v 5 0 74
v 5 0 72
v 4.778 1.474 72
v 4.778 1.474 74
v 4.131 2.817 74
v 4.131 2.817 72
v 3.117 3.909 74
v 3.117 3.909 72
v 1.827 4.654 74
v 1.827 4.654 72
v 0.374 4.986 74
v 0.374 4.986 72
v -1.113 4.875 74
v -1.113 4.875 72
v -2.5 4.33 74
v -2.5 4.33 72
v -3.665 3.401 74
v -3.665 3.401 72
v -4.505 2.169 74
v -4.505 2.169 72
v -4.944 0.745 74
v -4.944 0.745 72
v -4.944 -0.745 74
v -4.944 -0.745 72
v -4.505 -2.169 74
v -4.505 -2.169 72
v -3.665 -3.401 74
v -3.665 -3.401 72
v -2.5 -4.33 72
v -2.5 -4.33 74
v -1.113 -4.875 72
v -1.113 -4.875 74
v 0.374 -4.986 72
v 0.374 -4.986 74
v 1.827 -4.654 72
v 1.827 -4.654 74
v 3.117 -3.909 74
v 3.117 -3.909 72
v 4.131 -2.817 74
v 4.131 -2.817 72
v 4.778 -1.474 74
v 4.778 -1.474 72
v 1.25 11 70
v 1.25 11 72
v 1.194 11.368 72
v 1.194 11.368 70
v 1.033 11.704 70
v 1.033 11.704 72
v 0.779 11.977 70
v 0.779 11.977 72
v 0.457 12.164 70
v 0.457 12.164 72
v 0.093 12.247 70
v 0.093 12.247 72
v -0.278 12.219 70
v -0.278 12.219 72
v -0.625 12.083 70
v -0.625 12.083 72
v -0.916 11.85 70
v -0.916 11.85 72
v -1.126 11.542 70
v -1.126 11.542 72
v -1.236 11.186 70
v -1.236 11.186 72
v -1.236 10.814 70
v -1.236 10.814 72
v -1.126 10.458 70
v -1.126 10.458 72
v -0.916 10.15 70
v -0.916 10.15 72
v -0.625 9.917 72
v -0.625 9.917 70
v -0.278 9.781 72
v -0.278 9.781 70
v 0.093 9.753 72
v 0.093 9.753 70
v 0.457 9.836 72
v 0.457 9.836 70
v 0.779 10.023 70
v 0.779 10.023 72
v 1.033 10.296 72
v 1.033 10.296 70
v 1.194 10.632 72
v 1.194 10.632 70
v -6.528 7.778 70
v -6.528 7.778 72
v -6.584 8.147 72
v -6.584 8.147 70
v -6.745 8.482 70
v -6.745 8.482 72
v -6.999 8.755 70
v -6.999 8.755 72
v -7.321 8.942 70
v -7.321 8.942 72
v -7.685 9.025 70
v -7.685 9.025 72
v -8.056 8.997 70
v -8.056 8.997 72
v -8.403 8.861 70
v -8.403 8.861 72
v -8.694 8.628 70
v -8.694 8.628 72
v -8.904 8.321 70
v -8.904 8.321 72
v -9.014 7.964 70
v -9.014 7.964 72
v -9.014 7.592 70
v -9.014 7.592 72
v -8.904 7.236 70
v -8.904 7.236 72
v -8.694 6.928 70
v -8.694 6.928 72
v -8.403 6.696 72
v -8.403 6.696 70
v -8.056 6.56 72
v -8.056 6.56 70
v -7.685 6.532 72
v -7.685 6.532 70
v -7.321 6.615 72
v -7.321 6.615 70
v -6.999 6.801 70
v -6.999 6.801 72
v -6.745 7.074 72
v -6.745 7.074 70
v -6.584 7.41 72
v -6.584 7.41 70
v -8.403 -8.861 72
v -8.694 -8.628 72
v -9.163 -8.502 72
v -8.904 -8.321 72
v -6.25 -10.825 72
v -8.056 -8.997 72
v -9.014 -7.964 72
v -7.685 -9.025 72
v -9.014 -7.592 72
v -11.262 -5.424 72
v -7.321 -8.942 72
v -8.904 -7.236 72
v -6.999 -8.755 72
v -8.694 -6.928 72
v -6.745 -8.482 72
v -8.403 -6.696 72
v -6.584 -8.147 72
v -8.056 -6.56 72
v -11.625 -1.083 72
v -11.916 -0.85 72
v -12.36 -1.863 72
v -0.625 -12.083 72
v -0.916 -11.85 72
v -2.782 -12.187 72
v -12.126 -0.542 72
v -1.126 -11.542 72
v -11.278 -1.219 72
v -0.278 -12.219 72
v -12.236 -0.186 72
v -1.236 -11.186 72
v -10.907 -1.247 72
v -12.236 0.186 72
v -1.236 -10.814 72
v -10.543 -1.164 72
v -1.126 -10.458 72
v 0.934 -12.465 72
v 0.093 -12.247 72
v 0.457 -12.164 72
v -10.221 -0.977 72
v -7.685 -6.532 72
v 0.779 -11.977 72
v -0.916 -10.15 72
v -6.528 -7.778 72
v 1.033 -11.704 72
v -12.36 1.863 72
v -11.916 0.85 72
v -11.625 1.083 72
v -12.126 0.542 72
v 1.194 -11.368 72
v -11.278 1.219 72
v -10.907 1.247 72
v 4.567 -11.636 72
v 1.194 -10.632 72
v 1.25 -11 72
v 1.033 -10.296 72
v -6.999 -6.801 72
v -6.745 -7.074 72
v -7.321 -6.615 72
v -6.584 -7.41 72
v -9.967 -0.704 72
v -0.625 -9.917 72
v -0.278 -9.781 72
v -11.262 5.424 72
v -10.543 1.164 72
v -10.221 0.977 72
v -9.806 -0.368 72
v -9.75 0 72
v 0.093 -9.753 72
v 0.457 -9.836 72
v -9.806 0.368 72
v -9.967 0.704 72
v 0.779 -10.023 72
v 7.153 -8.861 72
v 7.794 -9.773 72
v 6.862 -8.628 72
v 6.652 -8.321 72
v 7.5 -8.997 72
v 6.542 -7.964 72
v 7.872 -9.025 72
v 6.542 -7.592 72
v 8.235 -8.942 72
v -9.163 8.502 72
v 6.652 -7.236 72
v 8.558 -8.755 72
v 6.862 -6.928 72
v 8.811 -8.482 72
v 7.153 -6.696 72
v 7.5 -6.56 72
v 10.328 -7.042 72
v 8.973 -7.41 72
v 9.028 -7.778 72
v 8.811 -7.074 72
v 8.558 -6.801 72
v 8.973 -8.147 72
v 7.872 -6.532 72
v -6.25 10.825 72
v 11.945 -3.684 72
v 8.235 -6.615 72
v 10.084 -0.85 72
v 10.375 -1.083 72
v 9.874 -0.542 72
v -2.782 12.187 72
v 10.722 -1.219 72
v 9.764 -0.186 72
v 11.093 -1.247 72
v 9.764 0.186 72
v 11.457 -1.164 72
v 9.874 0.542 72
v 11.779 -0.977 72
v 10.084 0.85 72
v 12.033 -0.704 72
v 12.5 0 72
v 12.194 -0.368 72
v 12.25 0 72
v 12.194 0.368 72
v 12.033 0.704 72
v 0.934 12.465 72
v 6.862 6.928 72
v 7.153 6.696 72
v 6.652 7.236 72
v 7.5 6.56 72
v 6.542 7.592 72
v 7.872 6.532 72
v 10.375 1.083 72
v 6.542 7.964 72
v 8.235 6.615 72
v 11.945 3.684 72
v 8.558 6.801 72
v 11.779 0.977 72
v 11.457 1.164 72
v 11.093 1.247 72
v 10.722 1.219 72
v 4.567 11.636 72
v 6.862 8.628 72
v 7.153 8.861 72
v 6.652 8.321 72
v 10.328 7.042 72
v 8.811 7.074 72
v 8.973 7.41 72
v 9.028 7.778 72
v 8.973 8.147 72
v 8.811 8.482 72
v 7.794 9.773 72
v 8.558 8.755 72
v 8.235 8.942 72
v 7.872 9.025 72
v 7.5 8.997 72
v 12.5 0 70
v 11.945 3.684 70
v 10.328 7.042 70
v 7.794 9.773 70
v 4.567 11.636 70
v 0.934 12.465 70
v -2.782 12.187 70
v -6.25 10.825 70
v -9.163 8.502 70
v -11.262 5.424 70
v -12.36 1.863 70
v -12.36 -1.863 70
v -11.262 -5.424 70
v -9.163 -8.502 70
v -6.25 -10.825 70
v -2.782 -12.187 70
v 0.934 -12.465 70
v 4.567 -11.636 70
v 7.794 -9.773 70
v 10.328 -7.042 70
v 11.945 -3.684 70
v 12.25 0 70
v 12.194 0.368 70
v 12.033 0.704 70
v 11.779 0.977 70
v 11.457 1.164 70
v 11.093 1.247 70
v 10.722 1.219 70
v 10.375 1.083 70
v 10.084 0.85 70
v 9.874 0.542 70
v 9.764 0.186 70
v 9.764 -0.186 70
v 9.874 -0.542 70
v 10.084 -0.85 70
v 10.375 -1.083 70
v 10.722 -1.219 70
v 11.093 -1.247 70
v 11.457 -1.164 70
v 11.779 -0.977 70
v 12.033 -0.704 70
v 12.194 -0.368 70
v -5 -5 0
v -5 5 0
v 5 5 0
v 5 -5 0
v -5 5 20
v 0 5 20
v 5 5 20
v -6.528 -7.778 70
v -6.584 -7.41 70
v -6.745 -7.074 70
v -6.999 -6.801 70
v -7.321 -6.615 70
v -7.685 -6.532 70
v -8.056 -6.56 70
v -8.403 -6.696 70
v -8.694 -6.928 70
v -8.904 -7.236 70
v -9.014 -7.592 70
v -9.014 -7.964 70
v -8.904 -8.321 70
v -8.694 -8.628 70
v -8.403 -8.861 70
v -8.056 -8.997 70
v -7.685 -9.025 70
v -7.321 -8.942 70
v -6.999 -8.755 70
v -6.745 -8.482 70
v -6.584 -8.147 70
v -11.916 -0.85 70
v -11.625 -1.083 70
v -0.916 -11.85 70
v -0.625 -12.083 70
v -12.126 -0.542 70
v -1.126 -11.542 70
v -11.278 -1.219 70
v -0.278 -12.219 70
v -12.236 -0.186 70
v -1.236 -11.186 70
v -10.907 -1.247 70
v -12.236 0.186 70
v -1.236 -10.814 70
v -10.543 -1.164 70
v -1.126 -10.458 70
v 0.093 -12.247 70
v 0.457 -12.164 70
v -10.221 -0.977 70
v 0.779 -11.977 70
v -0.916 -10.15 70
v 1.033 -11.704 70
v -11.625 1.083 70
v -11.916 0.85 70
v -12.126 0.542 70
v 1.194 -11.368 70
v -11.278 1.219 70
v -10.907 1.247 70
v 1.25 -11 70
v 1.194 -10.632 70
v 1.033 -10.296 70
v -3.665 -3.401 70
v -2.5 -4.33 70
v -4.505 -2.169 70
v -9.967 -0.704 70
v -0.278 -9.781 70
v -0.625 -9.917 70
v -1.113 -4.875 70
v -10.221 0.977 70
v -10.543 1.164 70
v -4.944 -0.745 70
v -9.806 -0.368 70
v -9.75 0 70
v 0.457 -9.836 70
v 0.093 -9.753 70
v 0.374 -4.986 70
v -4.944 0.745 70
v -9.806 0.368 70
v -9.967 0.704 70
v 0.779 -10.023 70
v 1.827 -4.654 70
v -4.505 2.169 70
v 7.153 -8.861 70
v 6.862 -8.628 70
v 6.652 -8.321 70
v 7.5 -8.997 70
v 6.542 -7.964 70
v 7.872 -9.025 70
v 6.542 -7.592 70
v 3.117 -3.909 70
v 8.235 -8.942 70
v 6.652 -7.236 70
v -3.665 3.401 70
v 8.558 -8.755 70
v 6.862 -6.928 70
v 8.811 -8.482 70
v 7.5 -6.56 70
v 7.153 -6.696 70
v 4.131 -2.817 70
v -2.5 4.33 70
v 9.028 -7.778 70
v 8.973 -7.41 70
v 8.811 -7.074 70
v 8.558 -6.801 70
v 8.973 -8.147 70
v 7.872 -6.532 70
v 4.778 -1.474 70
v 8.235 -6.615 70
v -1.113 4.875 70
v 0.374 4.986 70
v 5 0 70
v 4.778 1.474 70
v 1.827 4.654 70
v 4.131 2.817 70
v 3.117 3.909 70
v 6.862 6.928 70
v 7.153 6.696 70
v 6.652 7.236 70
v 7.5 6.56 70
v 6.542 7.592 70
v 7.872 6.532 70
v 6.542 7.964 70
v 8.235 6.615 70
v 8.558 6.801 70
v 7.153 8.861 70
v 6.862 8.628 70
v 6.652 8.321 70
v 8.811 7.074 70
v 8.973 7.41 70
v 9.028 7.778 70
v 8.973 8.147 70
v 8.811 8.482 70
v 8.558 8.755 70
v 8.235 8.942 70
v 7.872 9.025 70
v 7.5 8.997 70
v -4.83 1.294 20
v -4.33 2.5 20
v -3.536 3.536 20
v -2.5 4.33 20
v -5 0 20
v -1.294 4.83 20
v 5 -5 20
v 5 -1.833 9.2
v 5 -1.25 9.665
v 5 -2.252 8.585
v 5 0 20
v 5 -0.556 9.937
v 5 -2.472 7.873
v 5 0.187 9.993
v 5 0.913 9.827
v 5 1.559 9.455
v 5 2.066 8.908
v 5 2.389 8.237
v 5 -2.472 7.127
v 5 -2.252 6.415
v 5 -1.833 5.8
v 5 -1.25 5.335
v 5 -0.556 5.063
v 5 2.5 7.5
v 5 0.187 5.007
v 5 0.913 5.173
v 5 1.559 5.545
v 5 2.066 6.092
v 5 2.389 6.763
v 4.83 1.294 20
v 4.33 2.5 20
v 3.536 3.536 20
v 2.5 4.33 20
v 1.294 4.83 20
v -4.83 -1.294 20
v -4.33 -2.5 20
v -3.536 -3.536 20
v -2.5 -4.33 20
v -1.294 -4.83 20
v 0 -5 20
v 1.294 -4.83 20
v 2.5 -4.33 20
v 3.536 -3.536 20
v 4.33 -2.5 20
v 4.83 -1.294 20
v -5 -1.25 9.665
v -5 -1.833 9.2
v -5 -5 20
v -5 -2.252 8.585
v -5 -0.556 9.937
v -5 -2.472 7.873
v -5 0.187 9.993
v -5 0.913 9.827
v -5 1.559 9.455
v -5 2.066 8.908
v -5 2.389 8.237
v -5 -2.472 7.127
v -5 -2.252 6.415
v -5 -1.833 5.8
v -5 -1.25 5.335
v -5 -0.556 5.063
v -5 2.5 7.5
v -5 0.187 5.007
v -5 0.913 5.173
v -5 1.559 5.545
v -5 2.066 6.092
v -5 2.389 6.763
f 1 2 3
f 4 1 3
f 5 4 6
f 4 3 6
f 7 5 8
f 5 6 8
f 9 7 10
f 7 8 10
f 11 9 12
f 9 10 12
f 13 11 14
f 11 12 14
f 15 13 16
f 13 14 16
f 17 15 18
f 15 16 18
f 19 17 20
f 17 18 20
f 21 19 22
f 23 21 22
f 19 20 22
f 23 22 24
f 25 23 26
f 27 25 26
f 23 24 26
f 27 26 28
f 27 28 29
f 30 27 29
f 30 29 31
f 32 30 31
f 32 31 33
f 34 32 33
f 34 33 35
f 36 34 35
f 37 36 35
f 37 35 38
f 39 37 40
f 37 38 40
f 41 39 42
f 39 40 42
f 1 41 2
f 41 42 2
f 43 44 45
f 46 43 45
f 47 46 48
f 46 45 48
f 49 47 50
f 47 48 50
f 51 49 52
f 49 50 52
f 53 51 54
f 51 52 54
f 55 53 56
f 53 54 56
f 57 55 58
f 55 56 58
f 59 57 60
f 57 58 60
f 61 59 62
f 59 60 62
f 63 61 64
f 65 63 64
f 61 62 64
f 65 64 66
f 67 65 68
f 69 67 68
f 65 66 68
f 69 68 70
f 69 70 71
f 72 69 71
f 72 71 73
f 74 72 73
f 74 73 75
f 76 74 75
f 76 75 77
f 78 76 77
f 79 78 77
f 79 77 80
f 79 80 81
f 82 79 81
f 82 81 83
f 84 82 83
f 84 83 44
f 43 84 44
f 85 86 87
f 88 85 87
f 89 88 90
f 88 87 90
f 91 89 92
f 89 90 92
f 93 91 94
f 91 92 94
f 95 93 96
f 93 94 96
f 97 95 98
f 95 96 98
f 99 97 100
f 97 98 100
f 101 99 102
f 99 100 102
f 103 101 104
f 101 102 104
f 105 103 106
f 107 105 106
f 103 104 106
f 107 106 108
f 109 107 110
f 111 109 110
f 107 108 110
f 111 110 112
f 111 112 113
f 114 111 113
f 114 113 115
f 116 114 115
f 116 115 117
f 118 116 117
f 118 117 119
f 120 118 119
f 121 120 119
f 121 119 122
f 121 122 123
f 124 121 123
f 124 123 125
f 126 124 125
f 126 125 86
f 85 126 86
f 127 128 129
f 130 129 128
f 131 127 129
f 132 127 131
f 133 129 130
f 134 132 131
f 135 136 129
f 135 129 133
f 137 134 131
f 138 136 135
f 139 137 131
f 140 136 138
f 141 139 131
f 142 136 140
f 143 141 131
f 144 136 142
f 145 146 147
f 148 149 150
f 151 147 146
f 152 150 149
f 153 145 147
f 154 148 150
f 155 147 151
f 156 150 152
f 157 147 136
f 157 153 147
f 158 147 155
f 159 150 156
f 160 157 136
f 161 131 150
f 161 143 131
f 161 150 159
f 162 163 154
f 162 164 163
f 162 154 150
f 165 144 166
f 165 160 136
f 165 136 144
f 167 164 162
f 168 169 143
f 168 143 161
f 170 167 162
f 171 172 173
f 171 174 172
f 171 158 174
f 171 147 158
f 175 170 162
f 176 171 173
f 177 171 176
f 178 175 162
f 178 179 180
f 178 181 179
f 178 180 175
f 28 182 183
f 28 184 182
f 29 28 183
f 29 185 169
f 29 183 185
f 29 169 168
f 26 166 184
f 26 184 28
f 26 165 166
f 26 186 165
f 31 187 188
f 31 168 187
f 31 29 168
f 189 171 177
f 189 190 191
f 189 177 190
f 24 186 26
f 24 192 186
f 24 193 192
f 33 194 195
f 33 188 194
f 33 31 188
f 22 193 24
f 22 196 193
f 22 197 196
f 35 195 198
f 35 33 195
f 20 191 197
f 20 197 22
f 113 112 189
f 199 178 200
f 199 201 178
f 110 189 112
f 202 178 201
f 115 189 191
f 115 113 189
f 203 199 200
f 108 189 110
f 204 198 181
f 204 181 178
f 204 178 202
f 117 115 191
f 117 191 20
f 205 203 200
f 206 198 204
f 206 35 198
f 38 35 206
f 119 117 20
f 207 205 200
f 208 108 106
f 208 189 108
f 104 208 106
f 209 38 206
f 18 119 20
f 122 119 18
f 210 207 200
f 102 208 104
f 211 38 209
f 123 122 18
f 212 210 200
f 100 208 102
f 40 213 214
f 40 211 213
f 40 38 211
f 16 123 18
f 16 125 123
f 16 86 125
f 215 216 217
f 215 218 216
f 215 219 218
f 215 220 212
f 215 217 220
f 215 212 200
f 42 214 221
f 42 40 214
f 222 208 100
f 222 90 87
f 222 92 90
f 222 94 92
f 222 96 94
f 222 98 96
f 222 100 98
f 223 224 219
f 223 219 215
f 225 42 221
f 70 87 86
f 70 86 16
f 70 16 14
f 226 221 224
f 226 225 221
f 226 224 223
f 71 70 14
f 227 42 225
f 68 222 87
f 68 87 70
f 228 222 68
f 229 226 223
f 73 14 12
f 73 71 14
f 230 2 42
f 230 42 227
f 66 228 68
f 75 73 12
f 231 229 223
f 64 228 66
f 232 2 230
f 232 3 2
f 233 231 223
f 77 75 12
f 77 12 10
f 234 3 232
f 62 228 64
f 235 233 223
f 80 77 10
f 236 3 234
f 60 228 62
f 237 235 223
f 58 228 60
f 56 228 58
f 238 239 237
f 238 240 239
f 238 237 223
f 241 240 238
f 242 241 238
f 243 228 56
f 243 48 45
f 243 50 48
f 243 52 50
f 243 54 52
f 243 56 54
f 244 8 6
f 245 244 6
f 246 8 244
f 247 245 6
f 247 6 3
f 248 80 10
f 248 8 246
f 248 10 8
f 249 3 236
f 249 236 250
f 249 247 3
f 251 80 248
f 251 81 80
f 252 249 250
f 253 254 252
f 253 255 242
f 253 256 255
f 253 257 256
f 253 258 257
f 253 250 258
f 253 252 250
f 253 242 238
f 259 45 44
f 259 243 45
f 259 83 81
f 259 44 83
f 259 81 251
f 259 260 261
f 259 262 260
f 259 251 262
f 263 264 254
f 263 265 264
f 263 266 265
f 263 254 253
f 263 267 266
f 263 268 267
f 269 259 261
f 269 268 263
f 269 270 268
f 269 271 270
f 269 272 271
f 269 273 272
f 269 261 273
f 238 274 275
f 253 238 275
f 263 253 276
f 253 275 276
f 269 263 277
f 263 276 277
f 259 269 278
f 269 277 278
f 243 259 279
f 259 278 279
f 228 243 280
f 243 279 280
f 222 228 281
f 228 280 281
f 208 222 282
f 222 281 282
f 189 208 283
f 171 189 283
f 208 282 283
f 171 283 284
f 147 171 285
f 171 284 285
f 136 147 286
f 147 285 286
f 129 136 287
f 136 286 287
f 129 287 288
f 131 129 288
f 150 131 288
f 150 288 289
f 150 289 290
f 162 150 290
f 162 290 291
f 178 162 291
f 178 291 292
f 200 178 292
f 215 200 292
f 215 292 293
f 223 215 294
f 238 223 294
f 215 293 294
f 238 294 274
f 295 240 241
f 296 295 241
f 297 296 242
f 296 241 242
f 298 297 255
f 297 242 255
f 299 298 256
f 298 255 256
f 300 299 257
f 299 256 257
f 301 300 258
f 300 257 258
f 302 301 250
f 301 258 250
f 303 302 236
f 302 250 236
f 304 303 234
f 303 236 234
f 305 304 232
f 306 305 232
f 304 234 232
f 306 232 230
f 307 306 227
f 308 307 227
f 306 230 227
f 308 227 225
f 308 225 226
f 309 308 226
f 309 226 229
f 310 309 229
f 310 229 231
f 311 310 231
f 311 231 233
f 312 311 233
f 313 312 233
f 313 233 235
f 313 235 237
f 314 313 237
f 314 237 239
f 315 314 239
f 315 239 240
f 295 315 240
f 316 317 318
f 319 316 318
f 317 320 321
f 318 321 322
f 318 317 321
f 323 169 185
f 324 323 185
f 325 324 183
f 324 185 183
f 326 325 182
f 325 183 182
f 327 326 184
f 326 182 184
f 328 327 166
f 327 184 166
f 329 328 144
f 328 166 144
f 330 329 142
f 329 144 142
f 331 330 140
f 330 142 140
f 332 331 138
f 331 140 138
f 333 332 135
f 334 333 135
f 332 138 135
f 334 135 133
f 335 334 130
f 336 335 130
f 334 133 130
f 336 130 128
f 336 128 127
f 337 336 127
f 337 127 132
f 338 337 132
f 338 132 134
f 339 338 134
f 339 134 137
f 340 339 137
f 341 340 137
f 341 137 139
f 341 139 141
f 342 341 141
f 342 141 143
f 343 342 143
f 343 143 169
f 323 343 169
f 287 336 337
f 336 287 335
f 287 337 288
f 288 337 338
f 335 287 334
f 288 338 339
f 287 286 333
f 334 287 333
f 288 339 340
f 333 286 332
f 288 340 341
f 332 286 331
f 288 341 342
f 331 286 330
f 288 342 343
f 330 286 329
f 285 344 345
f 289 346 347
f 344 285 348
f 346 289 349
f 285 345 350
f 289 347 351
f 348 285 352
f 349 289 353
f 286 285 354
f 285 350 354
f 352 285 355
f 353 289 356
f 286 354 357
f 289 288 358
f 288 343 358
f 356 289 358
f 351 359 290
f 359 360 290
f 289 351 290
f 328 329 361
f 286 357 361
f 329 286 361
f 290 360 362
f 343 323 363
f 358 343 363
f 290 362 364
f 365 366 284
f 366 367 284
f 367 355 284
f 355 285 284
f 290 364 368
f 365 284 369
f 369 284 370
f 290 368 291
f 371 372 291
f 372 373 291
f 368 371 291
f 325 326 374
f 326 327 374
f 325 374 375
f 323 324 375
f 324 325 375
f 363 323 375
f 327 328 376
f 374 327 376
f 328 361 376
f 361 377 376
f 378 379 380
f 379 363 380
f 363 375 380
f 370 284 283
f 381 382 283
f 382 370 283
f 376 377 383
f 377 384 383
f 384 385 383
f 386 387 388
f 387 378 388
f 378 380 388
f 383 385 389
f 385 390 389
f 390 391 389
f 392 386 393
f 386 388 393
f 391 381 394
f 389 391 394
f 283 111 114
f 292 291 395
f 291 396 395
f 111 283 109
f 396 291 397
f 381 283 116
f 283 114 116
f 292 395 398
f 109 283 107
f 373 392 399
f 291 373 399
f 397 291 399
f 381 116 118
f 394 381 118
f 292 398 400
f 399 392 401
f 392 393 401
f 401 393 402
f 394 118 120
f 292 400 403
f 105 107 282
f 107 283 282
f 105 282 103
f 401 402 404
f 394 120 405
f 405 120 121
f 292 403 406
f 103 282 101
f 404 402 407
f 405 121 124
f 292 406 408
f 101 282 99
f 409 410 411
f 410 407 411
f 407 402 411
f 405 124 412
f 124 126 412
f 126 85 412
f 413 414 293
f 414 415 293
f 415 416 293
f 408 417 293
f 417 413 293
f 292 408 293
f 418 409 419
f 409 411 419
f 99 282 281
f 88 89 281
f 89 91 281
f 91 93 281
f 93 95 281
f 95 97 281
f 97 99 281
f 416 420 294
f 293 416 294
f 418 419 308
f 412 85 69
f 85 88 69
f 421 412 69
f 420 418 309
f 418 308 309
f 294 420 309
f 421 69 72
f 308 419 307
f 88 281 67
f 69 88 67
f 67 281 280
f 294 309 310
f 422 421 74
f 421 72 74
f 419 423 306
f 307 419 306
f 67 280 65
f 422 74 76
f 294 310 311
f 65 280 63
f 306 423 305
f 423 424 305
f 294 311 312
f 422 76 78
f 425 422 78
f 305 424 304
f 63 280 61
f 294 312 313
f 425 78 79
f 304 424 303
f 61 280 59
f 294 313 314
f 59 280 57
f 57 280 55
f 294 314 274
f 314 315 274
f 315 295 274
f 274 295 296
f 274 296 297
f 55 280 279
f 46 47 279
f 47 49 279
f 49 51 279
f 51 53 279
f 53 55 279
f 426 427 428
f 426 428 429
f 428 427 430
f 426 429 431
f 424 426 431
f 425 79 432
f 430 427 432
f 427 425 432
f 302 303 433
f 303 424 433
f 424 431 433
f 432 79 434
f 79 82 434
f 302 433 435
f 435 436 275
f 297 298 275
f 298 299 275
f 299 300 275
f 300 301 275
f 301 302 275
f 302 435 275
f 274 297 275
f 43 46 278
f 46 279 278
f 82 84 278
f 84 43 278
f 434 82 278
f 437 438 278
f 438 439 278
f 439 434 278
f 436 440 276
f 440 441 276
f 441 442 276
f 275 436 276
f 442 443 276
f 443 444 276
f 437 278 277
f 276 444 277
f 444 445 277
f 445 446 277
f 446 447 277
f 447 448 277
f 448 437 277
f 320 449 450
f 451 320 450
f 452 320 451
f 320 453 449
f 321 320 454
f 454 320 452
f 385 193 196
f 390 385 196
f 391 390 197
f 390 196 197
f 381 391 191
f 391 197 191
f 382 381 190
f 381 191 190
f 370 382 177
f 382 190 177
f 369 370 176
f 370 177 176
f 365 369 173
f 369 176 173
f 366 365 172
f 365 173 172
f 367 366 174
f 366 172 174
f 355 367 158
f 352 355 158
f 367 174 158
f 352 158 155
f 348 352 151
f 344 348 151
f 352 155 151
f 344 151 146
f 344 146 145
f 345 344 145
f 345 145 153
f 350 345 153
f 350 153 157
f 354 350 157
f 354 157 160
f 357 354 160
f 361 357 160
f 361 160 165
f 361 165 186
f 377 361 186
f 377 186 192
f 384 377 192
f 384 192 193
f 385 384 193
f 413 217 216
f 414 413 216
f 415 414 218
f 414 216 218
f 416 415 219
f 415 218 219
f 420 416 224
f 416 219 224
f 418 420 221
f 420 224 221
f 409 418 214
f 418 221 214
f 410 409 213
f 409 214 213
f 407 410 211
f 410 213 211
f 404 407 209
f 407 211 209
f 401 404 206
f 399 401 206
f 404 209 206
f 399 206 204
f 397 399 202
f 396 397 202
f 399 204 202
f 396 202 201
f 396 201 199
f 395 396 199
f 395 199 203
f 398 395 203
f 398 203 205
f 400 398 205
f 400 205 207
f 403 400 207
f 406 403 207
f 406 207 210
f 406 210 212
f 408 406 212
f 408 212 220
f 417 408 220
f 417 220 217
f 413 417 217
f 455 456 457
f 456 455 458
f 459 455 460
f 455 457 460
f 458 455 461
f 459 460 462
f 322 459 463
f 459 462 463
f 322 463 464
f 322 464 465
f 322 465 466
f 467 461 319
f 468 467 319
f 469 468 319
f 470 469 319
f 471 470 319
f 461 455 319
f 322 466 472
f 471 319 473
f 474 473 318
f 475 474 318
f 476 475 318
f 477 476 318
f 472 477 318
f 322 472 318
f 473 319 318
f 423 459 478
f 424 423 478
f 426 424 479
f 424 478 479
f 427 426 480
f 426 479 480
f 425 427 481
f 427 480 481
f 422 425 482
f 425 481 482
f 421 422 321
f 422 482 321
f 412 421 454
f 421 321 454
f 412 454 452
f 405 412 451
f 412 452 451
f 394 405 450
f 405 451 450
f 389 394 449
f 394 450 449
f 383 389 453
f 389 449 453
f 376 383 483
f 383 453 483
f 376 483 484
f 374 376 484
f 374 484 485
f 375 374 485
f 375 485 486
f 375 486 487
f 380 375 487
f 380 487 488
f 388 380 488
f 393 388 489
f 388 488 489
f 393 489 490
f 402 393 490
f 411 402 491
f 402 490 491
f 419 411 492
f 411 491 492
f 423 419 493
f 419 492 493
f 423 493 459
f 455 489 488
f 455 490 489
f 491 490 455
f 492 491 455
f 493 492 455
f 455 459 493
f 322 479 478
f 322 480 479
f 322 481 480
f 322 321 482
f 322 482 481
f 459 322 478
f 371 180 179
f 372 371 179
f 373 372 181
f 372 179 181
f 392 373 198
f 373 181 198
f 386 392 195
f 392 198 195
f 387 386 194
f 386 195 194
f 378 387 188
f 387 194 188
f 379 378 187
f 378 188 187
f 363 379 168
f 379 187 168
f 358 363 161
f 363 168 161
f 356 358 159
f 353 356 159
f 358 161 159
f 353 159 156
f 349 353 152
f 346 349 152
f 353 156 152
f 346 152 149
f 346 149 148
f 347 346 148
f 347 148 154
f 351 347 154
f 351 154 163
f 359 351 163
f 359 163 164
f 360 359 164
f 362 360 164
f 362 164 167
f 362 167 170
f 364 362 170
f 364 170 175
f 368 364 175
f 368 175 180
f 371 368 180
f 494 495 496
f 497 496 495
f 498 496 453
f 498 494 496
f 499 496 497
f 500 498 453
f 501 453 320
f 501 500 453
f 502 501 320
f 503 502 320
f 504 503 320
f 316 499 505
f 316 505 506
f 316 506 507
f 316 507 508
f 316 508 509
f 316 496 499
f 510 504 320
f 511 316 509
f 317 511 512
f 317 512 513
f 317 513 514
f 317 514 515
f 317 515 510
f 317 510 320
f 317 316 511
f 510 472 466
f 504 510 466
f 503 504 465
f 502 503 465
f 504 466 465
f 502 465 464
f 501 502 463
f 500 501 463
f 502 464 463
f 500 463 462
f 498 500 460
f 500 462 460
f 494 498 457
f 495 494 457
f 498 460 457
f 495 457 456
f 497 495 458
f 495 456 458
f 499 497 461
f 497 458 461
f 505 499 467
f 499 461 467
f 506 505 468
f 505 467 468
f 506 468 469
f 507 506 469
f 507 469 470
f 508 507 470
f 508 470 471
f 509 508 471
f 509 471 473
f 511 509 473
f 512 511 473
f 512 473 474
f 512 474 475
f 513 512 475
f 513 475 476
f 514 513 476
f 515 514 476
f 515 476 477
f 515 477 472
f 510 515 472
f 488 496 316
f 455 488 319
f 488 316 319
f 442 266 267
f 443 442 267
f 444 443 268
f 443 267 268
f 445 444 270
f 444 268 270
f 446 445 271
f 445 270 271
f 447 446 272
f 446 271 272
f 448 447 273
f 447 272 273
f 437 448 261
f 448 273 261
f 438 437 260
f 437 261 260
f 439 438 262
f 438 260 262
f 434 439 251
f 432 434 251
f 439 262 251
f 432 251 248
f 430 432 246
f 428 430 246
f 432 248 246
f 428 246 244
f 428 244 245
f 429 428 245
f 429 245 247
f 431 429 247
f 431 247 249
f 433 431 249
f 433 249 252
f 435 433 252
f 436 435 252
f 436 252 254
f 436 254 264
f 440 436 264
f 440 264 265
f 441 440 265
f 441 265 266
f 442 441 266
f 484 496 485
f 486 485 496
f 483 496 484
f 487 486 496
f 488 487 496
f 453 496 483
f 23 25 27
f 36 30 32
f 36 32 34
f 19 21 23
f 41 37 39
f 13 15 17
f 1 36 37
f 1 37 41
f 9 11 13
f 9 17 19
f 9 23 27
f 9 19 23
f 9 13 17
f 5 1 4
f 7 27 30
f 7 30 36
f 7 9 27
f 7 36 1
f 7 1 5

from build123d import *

# Parameters (mm, degrees)
SKIZZE1_W                       = 10
SKIZZE1_H                       = 10
AUFSATZ_LINEAR_AUSTRAGEN1_DEPTH = 20
SKIZZE2_R                       = 2.5
SCHNITT_LINEAR_AUSTRAGEN1_DEPTH = 20
SKIZZE3_R                       = 5
AUFSATZ_LINEAR_AUSTRAGEN2_DEPTH = 50
SKIZZE4_R                       = 12.5
AUFSATZ_LINEAR_AUSTRAGEN3_DEPTH = 2
SKIZZE5_R                       = 1.25
SCHNITT_LINEAR_AUSTRAGEN2_DEPTH = 5
SKIZZE6_R                       = 5
AUFSATZ_LINEAR_AUSTRAGEN4_DEPTH = 2


with BuildPart() as part:
    # Skizze1 → Aufsatz-Linear austragen1 (new body)
    with BuildSketch(Plane.XY):
        Rectangle(SKIZZE1_W, SKIZZE1_H)
    extrude(amount=AUFSATZ_LINEAR_AUSTRAGEN1_DEPTH)

    # Skizze2 → Schnitt-Linear austragen1 (cut)
    with BuildSketch(Plane(origin=(5, 0, 0), x_dir=(0, 0, -1), z_dir=(1, 0, 0))):
        with Locations(Location((-7.5, 0, 0), (0, 0, 90))):
            Circle(SKIZZE2_R)
    extrude(amount=-SCHNITT_LINEAR_AUSTRAGEN1_DEPTH, mode=Mode.SUBTRACT)

    # Skizze3 → Aufsatz-Linear austragen2 (add)
    with BuildSketch(Plane.XY.offset(20)):
        Circle(SKIZZE3_R)
    extrude(amount=AUFSATZ_LINEAR_AUSTRAGEN2_DEPTH)

    # Skizze4 → Aufsatz-Linear austragen3 (add)
    with BuildSketch(Plane.XY.offset(70)):
        Circle(SKIZZE4_R)
    extrude(amount=AUFSATZ_LINEAR_AUSTRAGEN3_DEPTH)

    # Skizze5 → Schnitt-Linear austragen2 (cut)
    with BuildSketch(Plane.XY.offset(72)):
        with Locations((0, 11)):
            Circle(SKIZZE5_R)
        with Locations((7.778174593, 7.778174593)):
            Circle(SKIZZE5_R)
        with Locations((11, 0)):
            Circle(SKIZZE5_R)
        with Locations((7.778174593, -7.778174593)):
            Circle(SKIZZE5_R)
        with Locations((0, -11)):
            Circle(SKIZZE5_R)
        with Locations((-7.778174593, -7.778174593)):
            Circle(SKIZZE5_R)
        with Locations((-11, 0)):
            Circle(SKIZZE5_R)
        with Locations((-7.778174593, 7.778174593)):
            Circle(SKIZZE5_R)
    extrude(amount=-SCHNITT_LINEAR_AUSTRAGEN2_DEPTH, mode=Mode.SUBTRACT)

    # Skizze6 → Aufsatz-Linear austragen4 (add)
    with BuildSketch(Plane.XY.offset(72)):
        Circle(SKIZZE6_R)
    extrude(amount=AUFSATZ_LINEAR_AUSTRAGEN4_DEPTH)


solid = part.part
